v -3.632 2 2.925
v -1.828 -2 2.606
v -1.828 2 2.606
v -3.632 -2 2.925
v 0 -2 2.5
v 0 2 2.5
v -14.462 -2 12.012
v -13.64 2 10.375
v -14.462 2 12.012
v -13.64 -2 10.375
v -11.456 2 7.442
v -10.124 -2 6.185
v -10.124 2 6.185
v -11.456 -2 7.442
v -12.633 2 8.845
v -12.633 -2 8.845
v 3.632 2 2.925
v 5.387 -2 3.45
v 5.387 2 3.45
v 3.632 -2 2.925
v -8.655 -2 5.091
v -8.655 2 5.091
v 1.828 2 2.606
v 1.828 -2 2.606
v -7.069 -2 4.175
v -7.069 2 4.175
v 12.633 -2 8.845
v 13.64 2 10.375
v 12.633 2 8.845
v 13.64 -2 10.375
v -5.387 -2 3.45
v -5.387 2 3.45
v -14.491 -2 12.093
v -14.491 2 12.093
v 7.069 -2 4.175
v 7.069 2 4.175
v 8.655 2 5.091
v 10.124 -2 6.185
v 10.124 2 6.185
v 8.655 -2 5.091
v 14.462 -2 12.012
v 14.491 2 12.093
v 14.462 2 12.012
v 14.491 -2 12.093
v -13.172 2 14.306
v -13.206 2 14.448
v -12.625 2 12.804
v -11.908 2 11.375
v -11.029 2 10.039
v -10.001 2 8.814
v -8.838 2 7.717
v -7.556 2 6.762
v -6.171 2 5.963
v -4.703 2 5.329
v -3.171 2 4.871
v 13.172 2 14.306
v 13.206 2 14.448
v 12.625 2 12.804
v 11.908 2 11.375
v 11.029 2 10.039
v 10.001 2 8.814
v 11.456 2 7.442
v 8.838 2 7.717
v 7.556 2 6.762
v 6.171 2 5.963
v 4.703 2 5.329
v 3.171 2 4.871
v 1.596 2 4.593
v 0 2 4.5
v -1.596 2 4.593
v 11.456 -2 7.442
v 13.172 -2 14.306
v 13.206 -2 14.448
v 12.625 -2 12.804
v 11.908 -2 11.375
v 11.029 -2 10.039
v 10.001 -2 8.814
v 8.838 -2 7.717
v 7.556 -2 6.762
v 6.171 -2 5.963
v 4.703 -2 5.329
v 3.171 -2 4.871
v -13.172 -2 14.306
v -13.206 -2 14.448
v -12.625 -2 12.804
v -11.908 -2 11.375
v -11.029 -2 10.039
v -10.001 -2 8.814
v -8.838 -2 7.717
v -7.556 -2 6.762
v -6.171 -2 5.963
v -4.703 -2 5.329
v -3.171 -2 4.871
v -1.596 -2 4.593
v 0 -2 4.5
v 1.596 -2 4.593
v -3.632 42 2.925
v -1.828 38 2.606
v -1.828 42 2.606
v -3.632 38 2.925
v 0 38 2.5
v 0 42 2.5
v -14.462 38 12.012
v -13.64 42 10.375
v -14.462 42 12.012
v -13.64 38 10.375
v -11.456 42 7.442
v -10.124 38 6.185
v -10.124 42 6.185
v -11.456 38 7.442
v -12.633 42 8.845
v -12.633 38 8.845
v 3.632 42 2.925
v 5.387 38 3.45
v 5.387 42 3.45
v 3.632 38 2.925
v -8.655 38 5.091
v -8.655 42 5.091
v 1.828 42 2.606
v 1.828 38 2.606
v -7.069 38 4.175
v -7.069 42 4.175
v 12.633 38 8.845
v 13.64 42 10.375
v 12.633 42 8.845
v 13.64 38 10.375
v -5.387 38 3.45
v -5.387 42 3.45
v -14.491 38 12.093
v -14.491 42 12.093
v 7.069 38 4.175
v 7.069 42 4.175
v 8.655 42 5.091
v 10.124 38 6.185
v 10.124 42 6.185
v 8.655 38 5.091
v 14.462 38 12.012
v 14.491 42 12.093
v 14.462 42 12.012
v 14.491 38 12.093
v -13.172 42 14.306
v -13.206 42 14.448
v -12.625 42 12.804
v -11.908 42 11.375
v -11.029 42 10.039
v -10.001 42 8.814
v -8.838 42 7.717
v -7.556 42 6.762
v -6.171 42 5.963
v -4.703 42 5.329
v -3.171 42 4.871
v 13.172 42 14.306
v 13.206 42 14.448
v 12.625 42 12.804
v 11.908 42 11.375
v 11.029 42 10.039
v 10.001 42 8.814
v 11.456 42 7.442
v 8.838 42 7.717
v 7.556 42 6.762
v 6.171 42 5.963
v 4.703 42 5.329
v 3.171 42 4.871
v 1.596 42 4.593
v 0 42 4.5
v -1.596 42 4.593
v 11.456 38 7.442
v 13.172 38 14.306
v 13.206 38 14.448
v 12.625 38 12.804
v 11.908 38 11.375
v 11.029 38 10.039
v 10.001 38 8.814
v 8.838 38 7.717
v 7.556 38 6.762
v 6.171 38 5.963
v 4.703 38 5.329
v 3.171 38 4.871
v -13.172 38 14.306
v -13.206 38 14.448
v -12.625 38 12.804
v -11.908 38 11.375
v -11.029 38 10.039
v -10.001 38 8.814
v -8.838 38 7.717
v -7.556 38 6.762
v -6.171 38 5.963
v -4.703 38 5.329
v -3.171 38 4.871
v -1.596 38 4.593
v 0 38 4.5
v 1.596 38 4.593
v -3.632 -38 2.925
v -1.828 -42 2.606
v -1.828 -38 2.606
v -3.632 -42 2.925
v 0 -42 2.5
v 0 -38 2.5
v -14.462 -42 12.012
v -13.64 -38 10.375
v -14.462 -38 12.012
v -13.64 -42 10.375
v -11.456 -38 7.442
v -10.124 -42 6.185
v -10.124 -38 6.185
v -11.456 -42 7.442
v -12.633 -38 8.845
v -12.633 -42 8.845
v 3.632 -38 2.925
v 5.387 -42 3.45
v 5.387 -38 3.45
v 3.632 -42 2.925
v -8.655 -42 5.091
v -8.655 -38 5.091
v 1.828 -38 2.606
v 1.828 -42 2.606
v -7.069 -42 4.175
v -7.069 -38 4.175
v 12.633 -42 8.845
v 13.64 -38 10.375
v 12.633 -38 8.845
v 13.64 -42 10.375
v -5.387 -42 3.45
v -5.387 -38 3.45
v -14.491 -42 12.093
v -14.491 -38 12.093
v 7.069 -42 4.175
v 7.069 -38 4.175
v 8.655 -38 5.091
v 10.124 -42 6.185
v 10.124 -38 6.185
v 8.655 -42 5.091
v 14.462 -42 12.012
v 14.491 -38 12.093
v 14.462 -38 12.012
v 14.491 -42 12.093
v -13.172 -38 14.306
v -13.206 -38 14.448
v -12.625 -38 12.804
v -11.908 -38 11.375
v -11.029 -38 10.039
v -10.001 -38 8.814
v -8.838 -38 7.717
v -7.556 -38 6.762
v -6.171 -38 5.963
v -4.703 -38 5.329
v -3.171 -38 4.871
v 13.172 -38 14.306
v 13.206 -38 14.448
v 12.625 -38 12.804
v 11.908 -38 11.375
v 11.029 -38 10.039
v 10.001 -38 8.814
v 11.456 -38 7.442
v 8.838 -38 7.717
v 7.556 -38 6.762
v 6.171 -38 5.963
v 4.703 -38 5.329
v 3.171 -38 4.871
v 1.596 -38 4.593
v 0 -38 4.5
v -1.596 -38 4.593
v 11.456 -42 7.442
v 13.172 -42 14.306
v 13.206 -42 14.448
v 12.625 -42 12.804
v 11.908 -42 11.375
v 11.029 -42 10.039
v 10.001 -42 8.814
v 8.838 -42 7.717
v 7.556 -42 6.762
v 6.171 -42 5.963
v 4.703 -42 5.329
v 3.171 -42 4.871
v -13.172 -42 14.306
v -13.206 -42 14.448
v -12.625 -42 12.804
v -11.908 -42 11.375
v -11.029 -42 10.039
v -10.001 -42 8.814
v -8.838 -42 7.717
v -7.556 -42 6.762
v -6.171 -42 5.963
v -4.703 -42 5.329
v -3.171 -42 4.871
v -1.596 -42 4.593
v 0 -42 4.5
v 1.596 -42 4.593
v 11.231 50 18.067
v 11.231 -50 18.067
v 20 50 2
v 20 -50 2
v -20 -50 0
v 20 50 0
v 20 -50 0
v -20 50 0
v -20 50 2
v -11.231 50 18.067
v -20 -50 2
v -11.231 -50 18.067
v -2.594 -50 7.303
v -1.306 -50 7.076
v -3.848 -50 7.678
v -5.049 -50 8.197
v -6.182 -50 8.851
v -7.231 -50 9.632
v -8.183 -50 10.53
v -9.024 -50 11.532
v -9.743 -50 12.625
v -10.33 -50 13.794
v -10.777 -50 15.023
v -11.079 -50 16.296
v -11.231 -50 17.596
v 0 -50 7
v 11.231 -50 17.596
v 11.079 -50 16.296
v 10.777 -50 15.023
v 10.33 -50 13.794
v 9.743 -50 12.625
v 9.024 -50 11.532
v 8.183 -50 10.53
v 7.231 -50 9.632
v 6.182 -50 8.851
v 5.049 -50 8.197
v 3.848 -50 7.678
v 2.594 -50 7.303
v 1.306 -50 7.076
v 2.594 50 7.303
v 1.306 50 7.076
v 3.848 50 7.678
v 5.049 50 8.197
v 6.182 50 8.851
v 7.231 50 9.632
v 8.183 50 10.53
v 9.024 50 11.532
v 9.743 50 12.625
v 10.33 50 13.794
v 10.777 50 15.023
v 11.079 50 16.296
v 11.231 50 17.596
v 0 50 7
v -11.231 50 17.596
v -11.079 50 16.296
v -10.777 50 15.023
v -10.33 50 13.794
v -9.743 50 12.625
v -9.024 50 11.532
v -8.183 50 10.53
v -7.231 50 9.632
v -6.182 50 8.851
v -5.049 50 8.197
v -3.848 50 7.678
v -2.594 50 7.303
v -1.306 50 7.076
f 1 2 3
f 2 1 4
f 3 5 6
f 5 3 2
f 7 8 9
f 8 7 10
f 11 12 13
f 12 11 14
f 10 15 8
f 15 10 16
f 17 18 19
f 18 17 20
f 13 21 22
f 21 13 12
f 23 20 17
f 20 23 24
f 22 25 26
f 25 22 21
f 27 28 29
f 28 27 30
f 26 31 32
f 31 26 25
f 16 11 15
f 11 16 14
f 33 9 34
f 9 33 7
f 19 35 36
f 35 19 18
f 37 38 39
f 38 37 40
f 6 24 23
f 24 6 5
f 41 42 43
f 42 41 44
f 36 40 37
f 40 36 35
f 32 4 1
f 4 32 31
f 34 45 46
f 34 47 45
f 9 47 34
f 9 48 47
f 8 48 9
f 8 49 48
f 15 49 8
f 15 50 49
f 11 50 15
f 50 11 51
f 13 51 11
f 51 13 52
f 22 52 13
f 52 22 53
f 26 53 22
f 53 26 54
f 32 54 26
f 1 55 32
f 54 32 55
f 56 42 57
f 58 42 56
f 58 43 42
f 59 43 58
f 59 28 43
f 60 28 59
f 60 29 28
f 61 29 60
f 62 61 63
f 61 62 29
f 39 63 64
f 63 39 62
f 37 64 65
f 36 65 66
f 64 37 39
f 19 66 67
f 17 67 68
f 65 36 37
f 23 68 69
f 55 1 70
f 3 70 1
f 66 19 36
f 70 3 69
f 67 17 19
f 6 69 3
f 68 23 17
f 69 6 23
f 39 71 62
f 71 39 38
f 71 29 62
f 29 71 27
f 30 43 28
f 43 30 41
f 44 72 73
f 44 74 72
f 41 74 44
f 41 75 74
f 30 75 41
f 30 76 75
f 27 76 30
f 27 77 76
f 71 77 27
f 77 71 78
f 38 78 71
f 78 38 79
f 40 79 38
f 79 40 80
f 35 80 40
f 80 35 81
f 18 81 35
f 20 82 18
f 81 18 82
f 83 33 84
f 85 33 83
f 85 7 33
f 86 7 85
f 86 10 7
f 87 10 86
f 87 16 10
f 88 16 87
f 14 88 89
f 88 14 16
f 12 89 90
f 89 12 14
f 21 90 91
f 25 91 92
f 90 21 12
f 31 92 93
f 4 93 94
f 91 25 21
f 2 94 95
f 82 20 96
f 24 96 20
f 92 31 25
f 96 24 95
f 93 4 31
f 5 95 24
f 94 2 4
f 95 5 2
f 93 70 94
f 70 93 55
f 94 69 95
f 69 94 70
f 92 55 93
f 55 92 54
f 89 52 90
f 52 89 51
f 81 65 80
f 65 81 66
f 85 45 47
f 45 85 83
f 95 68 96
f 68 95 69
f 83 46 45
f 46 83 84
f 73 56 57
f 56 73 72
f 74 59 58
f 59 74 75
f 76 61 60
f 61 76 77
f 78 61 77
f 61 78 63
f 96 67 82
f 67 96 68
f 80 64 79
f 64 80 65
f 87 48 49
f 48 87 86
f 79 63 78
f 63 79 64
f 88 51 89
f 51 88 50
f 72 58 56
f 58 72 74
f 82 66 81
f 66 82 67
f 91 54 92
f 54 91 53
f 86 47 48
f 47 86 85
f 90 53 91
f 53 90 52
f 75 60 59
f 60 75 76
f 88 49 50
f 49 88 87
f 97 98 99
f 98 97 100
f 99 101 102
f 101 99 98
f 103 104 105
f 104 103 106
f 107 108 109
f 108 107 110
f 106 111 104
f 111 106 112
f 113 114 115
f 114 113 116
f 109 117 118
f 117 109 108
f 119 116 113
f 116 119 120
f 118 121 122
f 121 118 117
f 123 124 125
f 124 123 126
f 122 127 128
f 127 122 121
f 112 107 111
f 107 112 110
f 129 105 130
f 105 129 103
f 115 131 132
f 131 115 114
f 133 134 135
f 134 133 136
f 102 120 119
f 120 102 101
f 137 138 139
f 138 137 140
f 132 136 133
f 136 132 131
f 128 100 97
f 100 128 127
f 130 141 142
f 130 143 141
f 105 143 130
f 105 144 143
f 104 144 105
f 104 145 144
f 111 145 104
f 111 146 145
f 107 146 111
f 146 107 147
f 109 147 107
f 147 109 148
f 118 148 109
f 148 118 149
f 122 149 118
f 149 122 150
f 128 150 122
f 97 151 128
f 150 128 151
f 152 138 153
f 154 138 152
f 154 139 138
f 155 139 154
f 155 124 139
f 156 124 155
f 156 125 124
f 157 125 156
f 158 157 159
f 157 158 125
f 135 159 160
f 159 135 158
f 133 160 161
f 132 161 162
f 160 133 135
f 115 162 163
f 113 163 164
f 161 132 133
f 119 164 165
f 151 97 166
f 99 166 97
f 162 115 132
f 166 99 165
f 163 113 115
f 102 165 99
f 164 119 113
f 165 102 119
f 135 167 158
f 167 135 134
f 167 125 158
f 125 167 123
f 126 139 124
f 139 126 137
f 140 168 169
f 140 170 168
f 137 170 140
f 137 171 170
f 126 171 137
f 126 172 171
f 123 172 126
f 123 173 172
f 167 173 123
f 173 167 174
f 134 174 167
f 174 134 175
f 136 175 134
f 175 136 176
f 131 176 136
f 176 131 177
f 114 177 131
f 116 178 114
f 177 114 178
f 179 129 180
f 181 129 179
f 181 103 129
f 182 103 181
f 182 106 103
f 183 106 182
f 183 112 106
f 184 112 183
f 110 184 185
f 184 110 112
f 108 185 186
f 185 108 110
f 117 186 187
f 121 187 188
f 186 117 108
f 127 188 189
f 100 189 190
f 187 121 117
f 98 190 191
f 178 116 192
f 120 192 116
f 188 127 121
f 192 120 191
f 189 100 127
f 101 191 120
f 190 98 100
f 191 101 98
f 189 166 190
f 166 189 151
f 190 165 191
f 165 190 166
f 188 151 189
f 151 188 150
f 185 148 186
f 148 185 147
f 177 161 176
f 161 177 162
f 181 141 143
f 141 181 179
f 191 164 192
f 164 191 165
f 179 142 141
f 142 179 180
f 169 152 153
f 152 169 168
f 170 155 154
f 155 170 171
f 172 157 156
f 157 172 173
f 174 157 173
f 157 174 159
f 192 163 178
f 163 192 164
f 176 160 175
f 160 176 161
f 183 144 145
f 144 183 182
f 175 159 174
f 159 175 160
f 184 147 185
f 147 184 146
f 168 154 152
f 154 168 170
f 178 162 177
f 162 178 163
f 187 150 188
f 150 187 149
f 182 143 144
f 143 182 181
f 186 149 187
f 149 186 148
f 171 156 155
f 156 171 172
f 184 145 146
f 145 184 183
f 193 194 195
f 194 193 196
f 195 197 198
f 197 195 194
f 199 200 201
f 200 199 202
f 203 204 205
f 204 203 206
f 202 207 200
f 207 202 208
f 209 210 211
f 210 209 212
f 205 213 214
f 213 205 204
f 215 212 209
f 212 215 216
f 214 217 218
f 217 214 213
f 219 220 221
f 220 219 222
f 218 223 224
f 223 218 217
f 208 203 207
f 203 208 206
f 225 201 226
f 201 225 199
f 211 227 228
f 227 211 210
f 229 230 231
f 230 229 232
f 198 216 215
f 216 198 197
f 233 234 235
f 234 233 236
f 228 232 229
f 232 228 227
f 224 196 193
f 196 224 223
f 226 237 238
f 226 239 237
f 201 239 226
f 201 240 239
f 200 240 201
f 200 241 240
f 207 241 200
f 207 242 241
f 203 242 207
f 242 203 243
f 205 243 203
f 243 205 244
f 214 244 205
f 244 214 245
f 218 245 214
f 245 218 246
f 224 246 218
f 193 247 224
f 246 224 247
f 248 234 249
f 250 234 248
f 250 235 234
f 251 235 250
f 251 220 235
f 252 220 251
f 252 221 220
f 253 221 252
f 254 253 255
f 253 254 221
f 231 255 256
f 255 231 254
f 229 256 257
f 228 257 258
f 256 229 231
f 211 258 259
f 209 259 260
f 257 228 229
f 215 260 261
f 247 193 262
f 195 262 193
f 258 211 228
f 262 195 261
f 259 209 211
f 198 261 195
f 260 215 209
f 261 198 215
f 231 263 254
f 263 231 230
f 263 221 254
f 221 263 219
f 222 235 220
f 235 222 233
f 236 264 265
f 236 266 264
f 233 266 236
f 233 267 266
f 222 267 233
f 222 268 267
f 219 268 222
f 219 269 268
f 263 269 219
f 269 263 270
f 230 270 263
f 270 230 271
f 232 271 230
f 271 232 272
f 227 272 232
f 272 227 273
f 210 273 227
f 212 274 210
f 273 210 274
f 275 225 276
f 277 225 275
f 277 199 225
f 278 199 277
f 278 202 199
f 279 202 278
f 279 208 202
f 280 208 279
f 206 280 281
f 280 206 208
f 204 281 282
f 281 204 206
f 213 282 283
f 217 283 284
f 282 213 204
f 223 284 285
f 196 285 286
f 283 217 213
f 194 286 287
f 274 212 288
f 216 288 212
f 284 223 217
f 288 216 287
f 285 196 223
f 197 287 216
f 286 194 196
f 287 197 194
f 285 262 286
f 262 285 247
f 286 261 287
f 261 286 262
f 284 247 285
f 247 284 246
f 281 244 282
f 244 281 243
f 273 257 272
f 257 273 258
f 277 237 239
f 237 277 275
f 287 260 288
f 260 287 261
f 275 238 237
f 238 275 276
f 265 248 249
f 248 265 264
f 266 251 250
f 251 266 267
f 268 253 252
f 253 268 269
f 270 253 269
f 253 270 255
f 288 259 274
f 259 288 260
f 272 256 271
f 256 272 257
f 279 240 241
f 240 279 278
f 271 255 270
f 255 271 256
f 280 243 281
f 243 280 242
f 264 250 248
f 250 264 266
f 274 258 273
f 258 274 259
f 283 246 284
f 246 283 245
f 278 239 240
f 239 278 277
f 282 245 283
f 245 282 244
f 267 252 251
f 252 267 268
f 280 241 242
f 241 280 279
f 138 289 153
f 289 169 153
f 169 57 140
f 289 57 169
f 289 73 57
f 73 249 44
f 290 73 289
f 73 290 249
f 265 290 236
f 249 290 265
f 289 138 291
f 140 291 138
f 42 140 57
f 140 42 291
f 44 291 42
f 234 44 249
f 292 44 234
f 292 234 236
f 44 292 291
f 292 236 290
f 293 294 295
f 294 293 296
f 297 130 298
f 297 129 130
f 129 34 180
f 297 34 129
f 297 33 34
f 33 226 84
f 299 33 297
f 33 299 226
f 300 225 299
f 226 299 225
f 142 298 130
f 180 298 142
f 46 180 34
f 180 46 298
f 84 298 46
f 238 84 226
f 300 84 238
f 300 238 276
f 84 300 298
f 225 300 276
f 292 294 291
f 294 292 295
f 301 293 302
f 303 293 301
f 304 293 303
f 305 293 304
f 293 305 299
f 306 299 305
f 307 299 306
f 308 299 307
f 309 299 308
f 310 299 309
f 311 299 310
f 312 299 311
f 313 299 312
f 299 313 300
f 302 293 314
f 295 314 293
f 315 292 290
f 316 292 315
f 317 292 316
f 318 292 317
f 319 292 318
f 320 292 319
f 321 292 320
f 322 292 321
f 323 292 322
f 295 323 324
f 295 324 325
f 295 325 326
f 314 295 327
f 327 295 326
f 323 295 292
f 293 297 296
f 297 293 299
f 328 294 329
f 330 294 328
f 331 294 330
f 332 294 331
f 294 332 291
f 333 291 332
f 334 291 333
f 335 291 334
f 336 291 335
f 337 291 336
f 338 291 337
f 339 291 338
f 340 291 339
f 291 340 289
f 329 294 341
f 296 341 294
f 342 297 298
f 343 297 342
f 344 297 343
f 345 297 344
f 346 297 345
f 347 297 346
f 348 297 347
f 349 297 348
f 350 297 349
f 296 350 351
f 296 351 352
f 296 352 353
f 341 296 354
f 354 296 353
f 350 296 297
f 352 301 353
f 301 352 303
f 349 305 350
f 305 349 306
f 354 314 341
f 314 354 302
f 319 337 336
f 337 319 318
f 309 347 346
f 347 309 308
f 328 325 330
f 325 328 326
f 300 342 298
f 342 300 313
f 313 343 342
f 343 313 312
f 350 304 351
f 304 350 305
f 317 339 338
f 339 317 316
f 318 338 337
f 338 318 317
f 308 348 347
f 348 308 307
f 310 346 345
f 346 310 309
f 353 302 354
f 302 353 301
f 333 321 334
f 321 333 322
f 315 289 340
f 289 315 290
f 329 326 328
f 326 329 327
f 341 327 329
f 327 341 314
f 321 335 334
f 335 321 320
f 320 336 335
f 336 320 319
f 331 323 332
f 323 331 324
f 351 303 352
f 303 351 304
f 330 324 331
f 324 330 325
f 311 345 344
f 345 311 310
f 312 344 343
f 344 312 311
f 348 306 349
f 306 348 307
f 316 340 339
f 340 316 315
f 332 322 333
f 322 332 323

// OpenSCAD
$fn=50+4;

//camera mount pole mounting legnth
camera_mount_lenght = 100 ;

//camera mount pole mount width
camera_mount_width = 40 ;

//camera leg pole diameter
pole_diameter = 22.5 ;

//ziptie width for atatchment add a bit for clearance
ziptie_width = 4 ;

//ziptie height for atatchment
ziptie_height = 2 ;

pole_diameter2 = pole_diameter/2;

centre_point = pole_diameter2+5+ziptie_height ;

rotate([0,0,90])difference(){
	hull(){
		translate([0,0,1])cube([camera_mount_lenght,camera_mount_width,2],true);
		difference(){
			translate([0,0,centre_point])rotate([0,90,0])cylinder(camera_mount_lenght,pole_diameter2-0.1,pole_diameter2-0.1,true);
			translate([0,0,centre_point+pole_diameter2])cube([camera_mount_lenght+2,pole_diameter+2,pole_diameter],true);
			}
		}
	translate([0,0,centre_point])rotate([0,90,0])cylinder(camera_mount_lenght+0.2,pole_diameter2,pole_diameter2,true);
//	translate([0,0,centre_point])cube([camera_mount_lenght+pole_diameter2,camera_mount_width+pole_diameter2,10],true);
	translate([camera_mount_lenght/2-10,0,0])zip();
	zip();
	translate([-camera_mount_lenght/2+10,0,0])zip();
	}

module zip(){
	translate([0,0,centre_point])rotate([0,90,0]){
		difference(){
			cylinder(ziptie_width,pole_diameter2+2.5+ziptie_height,pole_diameter2+2.5+ziptie_height,true);
			cylinder(ziptie_width+0.2,pole_diameter2+2.5,pole_diameter2+2.5,true);
			}
		}
	}
